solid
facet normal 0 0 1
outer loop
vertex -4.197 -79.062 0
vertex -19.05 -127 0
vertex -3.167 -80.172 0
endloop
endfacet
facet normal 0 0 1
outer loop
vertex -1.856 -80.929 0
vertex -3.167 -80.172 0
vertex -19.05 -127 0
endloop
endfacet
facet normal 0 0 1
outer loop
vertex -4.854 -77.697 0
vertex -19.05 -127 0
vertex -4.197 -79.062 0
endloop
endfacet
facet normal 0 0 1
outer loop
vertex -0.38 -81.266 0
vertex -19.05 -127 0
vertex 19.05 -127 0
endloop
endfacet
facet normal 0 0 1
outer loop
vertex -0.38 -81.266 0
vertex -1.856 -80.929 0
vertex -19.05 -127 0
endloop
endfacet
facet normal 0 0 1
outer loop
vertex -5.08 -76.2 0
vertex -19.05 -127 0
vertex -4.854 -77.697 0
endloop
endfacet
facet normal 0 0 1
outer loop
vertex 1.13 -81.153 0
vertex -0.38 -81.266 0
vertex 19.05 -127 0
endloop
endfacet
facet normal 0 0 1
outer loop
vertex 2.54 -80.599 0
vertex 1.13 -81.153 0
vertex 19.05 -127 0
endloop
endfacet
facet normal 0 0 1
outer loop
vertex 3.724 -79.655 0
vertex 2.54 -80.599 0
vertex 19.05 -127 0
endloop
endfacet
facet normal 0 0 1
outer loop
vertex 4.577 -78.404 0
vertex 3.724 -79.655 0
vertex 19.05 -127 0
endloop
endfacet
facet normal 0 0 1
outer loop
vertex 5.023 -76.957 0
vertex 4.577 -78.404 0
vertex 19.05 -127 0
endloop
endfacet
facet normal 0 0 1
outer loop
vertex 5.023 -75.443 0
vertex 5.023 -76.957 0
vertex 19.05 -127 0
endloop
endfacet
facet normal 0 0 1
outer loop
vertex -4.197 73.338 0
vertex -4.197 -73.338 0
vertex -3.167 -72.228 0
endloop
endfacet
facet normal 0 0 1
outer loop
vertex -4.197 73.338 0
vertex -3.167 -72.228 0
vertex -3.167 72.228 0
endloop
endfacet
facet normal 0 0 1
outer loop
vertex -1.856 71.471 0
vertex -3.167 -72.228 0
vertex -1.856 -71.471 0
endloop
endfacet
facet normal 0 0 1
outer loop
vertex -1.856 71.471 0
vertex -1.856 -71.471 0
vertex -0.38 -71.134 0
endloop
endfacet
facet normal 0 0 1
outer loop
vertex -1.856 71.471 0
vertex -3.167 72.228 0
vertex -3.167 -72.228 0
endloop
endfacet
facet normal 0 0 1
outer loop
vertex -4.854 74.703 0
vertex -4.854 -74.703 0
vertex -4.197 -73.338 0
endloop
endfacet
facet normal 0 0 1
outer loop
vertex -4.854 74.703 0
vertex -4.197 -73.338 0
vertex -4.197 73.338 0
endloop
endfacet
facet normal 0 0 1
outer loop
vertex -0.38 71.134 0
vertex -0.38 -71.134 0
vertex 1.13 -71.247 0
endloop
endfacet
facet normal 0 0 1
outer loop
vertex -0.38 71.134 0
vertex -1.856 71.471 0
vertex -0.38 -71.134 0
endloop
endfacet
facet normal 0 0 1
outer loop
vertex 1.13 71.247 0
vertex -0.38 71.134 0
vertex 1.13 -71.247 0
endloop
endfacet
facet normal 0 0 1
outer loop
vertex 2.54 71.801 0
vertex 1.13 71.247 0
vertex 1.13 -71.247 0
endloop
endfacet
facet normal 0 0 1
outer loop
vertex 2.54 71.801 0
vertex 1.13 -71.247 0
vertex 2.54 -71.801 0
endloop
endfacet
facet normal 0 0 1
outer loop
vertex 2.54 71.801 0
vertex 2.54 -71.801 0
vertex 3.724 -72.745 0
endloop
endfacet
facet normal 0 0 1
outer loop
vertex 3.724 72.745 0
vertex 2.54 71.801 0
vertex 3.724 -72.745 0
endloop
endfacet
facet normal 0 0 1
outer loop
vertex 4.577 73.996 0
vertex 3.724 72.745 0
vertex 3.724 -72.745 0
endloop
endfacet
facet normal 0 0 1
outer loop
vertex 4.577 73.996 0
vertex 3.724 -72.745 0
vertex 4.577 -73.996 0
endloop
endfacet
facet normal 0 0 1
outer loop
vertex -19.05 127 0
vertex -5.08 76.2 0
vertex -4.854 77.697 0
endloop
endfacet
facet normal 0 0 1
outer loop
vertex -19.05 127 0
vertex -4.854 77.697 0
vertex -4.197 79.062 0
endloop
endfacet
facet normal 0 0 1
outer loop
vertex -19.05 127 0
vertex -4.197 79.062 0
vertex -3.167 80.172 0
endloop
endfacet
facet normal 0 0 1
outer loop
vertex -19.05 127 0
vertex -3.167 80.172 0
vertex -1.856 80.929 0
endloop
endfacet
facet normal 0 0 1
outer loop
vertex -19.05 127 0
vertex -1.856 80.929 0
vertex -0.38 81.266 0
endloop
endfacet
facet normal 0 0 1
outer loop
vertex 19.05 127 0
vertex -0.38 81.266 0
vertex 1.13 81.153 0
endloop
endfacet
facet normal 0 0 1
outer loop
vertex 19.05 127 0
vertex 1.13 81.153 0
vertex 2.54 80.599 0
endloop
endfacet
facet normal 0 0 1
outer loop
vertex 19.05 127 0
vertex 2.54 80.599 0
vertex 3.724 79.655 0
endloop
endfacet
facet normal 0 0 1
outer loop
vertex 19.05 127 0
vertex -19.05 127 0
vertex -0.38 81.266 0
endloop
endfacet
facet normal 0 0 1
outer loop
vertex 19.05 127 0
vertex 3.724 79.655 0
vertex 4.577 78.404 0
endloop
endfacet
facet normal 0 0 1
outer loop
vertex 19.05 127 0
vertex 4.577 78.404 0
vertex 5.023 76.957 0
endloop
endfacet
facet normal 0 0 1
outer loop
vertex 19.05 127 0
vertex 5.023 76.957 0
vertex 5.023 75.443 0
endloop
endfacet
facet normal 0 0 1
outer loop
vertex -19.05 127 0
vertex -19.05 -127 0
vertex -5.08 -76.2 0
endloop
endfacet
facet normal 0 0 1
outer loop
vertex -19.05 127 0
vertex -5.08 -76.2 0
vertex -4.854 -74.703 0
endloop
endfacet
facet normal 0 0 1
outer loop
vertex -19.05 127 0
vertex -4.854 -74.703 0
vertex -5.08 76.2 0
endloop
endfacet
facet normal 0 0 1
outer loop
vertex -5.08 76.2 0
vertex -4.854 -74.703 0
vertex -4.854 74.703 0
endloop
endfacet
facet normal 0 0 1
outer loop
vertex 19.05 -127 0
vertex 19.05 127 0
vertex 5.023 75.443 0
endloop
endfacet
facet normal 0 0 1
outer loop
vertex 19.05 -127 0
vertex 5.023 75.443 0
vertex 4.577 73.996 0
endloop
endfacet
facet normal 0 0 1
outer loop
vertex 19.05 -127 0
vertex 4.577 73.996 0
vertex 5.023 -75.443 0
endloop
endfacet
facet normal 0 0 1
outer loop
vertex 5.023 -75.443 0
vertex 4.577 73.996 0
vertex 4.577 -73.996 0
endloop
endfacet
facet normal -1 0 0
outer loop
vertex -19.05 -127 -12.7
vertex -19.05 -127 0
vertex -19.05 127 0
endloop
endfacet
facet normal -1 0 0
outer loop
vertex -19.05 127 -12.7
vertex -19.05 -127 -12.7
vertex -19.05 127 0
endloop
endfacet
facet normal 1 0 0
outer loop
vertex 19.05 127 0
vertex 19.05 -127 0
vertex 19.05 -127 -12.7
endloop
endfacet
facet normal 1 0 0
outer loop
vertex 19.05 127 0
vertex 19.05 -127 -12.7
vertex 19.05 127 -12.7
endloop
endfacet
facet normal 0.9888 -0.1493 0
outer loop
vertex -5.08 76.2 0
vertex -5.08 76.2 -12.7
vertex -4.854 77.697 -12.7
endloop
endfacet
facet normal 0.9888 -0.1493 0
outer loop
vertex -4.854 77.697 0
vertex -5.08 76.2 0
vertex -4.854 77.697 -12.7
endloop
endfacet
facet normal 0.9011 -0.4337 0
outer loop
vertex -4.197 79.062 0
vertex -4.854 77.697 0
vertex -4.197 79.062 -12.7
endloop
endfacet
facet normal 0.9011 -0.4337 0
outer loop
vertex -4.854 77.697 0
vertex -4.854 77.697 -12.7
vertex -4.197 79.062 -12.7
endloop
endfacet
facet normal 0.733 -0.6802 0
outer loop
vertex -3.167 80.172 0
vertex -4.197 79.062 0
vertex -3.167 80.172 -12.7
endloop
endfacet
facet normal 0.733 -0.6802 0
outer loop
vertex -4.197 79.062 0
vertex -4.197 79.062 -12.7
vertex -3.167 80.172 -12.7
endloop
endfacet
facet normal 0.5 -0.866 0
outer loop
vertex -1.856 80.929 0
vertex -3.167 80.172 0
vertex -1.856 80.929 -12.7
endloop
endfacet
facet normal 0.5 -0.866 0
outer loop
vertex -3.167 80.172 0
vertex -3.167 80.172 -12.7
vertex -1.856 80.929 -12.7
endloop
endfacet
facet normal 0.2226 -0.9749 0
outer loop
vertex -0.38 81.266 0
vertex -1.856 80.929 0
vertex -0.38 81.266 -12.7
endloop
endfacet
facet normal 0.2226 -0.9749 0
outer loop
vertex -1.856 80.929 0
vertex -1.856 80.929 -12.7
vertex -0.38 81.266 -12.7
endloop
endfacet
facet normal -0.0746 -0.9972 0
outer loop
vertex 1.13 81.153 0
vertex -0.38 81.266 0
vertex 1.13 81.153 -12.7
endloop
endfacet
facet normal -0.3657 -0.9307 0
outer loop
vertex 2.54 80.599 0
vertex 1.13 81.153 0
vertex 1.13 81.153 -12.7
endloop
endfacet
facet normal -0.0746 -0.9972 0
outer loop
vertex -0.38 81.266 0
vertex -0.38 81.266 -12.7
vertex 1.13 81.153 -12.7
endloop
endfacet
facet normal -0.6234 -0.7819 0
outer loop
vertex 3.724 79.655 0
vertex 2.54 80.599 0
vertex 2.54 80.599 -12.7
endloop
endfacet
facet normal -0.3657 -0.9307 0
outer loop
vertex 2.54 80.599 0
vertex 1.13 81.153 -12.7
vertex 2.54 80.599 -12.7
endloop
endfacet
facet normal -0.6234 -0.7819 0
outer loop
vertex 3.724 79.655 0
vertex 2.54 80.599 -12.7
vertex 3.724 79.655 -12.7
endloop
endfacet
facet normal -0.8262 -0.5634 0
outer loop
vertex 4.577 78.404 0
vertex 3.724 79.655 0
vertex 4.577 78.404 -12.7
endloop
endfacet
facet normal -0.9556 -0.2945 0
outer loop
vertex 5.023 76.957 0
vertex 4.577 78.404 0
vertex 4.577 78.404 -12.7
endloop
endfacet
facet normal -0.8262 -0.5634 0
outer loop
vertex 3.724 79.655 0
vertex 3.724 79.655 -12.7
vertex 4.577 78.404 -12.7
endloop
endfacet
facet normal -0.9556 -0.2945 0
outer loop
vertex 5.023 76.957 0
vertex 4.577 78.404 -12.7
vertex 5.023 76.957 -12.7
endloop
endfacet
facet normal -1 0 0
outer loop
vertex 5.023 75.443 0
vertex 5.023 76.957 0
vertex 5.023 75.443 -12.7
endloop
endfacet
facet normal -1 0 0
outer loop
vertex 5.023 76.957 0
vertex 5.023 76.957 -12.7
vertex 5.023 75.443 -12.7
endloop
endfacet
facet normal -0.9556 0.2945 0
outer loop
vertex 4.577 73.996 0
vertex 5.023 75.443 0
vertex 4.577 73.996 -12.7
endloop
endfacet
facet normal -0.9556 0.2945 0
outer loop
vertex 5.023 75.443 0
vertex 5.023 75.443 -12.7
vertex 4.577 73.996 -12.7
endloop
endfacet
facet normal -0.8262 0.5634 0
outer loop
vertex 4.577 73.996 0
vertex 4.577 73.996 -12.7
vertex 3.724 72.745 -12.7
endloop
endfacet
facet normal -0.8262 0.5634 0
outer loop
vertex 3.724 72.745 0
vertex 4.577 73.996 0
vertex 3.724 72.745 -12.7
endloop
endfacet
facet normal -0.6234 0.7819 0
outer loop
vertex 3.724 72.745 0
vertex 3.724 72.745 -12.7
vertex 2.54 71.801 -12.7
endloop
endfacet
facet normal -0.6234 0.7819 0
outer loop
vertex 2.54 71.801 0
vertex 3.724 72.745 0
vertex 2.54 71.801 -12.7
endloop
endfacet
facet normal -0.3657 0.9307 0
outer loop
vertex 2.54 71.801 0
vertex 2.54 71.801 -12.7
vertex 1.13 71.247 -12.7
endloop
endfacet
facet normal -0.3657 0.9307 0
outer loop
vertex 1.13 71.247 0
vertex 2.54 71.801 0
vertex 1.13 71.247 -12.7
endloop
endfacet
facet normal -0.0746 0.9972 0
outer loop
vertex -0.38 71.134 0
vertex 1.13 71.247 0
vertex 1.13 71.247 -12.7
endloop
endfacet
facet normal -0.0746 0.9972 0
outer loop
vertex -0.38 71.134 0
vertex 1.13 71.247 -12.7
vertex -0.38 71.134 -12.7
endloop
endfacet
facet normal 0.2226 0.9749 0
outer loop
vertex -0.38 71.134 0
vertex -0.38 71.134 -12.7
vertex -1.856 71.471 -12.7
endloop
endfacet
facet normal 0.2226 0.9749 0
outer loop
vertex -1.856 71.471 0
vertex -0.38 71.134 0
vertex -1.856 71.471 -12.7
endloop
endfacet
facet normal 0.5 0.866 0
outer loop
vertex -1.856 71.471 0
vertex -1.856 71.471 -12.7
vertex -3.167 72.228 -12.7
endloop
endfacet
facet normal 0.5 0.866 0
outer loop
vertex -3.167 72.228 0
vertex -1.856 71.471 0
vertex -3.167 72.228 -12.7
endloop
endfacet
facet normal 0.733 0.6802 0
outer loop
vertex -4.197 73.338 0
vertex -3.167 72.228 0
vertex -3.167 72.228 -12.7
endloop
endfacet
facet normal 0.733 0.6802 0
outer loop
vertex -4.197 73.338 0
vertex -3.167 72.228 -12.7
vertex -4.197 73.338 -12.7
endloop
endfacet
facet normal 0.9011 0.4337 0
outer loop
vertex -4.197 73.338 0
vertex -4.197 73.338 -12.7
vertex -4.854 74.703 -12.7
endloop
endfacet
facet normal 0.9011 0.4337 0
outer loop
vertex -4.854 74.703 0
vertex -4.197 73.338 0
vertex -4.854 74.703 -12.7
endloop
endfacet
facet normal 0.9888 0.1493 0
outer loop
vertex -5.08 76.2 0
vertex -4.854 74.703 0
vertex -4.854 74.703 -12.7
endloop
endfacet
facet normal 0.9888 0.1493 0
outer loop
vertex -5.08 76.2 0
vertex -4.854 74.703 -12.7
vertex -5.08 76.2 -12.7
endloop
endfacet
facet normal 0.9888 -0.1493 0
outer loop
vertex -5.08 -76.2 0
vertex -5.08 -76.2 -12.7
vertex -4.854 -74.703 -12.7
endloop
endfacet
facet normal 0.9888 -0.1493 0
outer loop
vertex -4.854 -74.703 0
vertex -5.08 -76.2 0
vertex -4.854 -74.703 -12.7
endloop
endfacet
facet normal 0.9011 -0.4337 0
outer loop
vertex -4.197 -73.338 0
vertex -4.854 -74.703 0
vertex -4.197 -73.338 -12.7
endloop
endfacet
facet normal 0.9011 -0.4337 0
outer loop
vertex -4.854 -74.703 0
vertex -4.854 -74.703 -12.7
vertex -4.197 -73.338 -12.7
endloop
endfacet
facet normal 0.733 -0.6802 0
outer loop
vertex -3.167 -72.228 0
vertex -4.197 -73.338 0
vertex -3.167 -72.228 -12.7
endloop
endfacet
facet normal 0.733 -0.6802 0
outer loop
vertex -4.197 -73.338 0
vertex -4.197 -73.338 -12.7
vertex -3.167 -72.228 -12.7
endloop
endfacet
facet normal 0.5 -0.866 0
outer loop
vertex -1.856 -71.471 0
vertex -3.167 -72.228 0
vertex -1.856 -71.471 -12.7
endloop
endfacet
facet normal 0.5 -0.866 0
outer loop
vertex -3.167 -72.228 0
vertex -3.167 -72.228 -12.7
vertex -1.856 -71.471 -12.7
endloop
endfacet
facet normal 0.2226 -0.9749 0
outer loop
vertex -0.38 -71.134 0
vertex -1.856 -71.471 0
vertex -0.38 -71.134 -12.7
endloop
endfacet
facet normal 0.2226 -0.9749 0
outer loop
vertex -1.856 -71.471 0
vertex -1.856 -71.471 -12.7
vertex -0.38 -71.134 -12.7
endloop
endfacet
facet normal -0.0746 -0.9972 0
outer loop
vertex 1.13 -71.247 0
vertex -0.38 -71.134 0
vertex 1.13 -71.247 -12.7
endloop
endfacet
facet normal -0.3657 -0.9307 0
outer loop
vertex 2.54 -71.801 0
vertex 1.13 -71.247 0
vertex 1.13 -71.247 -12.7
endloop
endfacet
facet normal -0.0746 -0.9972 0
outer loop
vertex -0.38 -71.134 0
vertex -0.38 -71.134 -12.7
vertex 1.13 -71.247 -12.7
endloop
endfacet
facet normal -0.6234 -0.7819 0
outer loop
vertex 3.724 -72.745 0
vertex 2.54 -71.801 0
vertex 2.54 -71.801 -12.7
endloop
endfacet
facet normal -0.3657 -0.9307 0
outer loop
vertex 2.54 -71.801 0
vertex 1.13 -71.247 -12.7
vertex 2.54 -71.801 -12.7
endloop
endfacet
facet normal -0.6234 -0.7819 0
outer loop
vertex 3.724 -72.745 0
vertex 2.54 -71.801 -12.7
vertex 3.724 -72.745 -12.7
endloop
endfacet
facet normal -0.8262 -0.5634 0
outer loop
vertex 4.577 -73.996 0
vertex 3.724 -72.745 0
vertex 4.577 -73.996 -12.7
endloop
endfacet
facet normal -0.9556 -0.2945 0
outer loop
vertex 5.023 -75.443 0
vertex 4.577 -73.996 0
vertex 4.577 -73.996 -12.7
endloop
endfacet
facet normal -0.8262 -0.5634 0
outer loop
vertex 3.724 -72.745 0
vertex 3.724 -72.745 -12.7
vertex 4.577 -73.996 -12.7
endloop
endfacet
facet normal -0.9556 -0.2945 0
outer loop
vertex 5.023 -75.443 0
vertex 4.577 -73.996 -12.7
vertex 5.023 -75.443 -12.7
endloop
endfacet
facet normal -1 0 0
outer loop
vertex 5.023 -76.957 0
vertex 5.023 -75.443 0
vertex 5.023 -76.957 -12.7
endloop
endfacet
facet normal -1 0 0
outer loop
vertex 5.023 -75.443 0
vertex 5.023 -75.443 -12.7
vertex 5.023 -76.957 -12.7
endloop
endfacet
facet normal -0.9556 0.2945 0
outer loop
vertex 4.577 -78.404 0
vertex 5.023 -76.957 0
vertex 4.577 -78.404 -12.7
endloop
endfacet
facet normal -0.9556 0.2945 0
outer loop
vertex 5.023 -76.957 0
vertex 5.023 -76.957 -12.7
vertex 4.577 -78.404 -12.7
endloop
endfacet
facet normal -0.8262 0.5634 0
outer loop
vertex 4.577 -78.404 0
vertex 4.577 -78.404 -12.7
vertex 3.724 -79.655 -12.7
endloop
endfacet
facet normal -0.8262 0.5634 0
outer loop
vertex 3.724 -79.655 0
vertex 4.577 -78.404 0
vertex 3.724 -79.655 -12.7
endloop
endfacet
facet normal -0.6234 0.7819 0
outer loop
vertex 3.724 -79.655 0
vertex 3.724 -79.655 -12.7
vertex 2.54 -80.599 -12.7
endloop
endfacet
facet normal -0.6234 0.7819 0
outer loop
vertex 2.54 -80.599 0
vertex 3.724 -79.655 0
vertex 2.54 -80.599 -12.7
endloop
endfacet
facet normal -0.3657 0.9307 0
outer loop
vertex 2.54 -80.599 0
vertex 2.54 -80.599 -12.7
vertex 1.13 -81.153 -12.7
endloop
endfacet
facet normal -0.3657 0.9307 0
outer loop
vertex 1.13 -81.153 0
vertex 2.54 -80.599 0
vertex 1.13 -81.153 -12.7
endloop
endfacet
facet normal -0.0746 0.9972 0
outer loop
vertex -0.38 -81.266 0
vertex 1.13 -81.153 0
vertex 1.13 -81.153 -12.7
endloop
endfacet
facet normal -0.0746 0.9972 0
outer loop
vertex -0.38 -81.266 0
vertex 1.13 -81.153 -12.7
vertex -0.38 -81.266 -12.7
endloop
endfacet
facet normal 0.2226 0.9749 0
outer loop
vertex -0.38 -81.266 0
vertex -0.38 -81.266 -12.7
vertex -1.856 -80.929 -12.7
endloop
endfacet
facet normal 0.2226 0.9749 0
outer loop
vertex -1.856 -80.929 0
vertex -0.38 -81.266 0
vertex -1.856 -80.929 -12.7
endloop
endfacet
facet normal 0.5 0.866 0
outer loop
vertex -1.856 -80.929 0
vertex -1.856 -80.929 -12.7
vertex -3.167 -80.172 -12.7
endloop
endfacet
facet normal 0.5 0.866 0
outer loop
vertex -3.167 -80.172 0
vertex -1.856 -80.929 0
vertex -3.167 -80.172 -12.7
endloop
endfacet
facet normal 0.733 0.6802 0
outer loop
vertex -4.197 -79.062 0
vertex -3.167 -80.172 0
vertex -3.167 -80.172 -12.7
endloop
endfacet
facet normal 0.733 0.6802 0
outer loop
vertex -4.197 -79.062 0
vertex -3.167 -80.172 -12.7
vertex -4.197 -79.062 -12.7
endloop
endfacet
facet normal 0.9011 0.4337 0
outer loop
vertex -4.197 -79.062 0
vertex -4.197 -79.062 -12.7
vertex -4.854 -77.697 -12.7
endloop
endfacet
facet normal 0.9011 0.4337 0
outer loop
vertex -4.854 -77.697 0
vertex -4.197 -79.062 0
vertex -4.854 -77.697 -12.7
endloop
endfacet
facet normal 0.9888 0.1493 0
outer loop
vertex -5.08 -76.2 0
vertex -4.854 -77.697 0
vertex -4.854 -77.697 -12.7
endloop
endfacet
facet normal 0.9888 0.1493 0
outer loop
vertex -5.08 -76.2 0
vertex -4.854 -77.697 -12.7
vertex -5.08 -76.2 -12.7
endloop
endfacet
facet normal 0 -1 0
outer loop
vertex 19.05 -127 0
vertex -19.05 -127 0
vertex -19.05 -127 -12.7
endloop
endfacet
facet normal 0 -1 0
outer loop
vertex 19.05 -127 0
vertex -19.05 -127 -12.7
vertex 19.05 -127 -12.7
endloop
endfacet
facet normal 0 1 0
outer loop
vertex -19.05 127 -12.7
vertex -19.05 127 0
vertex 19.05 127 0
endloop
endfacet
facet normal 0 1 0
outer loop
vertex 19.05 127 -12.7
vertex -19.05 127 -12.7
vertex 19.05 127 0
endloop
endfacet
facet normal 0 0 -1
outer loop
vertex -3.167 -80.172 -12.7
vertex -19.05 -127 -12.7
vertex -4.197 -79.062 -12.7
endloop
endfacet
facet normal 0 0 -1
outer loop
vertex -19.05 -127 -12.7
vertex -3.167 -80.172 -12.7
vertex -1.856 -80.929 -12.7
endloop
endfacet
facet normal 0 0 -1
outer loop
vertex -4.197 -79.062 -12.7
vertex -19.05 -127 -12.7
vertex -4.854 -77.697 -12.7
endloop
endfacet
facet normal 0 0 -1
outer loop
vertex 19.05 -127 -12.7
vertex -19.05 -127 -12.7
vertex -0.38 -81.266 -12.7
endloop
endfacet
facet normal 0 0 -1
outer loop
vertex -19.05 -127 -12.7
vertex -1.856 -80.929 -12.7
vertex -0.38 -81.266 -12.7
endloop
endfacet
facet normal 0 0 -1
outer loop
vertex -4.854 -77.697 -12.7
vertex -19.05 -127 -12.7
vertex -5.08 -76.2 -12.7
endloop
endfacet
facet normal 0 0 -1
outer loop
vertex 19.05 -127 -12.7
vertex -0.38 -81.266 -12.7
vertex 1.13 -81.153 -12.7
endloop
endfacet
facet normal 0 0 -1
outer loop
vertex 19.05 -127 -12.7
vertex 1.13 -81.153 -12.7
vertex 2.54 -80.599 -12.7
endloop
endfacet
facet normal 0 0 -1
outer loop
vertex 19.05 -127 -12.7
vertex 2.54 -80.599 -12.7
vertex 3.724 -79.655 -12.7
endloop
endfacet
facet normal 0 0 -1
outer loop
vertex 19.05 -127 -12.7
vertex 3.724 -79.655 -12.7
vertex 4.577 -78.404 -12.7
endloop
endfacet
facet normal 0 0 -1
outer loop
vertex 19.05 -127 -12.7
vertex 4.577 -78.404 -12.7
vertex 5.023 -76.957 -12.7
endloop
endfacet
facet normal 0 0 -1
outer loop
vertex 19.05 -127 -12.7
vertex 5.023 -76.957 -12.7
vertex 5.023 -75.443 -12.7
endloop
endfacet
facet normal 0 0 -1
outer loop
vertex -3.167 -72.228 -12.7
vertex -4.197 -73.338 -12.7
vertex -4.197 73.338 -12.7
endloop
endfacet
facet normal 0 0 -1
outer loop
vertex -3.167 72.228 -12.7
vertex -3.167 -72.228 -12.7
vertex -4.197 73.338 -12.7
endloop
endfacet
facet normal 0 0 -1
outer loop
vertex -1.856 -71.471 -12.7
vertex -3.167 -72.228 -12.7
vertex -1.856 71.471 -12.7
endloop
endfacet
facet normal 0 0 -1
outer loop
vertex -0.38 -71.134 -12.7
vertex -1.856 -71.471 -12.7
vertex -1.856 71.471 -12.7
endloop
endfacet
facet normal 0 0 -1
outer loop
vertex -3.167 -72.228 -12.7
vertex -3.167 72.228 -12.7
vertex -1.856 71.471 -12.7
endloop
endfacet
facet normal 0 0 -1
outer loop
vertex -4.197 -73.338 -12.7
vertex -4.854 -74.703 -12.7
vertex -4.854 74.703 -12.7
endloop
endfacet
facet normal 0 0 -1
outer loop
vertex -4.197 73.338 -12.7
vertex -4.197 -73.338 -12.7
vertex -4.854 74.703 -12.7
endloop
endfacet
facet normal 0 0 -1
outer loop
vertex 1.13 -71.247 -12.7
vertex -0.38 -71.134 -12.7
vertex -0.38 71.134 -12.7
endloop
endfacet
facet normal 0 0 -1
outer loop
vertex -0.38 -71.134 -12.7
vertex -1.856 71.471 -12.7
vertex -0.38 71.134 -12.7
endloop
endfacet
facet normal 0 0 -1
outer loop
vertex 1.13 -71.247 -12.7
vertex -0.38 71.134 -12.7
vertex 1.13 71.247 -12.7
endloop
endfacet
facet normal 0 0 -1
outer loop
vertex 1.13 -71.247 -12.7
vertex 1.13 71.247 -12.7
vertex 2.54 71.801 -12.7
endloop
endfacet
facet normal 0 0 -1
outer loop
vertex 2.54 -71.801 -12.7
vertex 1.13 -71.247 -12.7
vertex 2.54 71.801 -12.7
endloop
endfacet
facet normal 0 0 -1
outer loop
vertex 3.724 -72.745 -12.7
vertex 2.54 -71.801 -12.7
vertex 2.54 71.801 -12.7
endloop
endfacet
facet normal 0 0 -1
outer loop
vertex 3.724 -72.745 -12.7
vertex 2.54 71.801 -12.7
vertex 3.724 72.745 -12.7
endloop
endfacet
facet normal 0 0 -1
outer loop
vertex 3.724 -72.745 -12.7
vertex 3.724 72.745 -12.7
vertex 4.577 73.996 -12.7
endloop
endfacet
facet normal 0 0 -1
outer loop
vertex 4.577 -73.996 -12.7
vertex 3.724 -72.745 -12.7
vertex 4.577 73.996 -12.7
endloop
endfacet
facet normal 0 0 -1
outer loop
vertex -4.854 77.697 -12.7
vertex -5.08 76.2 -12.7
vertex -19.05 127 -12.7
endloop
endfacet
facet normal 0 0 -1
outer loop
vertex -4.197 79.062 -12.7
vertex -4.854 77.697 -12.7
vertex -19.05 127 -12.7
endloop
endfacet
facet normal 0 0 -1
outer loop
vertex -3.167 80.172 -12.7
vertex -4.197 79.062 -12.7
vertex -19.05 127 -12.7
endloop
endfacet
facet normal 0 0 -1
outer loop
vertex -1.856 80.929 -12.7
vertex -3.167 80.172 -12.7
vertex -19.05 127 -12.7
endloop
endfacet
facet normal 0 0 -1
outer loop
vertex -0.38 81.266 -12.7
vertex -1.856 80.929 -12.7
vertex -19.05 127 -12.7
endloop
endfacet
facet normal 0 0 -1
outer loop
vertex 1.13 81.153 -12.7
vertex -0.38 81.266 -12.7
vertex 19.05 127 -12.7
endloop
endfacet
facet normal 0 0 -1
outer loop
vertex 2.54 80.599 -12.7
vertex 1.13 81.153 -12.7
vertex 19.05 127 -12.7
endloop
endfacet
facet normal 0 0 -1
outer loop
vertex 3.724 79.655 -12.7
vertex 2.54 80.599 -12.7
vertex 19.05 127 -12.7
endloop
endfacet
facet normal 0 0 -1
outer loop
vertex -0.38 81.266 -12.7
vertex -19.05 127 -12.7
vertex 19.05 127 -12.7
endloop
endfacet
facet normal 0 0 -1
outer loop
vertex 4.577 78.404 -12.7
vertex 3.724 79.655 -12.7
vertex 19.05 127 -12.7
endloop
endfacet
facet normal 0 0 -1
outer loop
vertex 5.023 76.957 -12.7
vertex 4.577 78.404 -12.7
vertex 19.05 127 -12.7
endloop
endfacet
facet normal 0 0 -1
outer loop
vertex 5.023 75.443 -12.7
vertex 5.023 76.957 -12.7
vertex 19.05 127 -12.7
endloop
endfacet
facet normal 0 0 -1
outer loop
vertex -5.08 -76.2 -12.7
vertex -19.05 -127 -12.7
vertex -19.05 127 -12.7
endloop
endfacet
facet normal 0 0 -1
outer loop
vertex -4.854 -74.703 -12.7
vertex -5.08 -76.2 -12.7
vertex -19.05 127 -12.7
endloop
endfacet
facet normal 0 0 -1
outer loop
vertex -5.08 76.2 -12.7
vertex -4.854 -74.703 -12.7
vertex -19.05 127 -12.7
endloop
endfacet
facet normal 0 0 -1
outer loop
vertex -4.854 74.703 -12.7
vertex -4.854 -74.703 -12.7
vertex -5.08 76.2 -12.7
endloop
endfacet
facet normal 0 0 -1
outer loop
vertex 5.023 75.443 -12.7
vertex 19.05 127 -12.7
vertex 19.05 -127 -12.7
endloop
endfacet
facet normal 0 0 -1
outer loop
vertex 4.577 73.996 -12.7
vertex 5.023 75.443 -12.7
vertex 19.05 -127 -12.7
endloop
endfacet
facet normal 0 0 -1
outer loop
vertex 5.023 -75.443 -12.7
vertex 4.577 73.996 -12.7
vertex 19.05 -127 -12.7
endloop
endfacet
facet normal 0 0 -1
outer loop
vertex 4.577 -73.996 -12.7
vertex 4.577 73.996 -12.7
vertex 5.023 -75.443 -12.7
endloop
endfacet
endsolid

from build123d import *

# Parameters (mm, degrees)
F0_W     = 38.1
F0_H     = 254
F1_DEPTH = 12.7
F3_D     = 10.16


with BuildPart() as f1:
    # F0 (on Top) → F1 (new body)
    with BuildSketch(Plane.XY):
        Rectangle(F0_W, F0_H)
    extrude(amount=-F1_DEPTH)

    # F3 (through all)
    with Locations(Plane.XY):
        with Locations((0, 76.2), (0, -76.2)):
            Hole(F3_D / 2)


solid = f1.part
